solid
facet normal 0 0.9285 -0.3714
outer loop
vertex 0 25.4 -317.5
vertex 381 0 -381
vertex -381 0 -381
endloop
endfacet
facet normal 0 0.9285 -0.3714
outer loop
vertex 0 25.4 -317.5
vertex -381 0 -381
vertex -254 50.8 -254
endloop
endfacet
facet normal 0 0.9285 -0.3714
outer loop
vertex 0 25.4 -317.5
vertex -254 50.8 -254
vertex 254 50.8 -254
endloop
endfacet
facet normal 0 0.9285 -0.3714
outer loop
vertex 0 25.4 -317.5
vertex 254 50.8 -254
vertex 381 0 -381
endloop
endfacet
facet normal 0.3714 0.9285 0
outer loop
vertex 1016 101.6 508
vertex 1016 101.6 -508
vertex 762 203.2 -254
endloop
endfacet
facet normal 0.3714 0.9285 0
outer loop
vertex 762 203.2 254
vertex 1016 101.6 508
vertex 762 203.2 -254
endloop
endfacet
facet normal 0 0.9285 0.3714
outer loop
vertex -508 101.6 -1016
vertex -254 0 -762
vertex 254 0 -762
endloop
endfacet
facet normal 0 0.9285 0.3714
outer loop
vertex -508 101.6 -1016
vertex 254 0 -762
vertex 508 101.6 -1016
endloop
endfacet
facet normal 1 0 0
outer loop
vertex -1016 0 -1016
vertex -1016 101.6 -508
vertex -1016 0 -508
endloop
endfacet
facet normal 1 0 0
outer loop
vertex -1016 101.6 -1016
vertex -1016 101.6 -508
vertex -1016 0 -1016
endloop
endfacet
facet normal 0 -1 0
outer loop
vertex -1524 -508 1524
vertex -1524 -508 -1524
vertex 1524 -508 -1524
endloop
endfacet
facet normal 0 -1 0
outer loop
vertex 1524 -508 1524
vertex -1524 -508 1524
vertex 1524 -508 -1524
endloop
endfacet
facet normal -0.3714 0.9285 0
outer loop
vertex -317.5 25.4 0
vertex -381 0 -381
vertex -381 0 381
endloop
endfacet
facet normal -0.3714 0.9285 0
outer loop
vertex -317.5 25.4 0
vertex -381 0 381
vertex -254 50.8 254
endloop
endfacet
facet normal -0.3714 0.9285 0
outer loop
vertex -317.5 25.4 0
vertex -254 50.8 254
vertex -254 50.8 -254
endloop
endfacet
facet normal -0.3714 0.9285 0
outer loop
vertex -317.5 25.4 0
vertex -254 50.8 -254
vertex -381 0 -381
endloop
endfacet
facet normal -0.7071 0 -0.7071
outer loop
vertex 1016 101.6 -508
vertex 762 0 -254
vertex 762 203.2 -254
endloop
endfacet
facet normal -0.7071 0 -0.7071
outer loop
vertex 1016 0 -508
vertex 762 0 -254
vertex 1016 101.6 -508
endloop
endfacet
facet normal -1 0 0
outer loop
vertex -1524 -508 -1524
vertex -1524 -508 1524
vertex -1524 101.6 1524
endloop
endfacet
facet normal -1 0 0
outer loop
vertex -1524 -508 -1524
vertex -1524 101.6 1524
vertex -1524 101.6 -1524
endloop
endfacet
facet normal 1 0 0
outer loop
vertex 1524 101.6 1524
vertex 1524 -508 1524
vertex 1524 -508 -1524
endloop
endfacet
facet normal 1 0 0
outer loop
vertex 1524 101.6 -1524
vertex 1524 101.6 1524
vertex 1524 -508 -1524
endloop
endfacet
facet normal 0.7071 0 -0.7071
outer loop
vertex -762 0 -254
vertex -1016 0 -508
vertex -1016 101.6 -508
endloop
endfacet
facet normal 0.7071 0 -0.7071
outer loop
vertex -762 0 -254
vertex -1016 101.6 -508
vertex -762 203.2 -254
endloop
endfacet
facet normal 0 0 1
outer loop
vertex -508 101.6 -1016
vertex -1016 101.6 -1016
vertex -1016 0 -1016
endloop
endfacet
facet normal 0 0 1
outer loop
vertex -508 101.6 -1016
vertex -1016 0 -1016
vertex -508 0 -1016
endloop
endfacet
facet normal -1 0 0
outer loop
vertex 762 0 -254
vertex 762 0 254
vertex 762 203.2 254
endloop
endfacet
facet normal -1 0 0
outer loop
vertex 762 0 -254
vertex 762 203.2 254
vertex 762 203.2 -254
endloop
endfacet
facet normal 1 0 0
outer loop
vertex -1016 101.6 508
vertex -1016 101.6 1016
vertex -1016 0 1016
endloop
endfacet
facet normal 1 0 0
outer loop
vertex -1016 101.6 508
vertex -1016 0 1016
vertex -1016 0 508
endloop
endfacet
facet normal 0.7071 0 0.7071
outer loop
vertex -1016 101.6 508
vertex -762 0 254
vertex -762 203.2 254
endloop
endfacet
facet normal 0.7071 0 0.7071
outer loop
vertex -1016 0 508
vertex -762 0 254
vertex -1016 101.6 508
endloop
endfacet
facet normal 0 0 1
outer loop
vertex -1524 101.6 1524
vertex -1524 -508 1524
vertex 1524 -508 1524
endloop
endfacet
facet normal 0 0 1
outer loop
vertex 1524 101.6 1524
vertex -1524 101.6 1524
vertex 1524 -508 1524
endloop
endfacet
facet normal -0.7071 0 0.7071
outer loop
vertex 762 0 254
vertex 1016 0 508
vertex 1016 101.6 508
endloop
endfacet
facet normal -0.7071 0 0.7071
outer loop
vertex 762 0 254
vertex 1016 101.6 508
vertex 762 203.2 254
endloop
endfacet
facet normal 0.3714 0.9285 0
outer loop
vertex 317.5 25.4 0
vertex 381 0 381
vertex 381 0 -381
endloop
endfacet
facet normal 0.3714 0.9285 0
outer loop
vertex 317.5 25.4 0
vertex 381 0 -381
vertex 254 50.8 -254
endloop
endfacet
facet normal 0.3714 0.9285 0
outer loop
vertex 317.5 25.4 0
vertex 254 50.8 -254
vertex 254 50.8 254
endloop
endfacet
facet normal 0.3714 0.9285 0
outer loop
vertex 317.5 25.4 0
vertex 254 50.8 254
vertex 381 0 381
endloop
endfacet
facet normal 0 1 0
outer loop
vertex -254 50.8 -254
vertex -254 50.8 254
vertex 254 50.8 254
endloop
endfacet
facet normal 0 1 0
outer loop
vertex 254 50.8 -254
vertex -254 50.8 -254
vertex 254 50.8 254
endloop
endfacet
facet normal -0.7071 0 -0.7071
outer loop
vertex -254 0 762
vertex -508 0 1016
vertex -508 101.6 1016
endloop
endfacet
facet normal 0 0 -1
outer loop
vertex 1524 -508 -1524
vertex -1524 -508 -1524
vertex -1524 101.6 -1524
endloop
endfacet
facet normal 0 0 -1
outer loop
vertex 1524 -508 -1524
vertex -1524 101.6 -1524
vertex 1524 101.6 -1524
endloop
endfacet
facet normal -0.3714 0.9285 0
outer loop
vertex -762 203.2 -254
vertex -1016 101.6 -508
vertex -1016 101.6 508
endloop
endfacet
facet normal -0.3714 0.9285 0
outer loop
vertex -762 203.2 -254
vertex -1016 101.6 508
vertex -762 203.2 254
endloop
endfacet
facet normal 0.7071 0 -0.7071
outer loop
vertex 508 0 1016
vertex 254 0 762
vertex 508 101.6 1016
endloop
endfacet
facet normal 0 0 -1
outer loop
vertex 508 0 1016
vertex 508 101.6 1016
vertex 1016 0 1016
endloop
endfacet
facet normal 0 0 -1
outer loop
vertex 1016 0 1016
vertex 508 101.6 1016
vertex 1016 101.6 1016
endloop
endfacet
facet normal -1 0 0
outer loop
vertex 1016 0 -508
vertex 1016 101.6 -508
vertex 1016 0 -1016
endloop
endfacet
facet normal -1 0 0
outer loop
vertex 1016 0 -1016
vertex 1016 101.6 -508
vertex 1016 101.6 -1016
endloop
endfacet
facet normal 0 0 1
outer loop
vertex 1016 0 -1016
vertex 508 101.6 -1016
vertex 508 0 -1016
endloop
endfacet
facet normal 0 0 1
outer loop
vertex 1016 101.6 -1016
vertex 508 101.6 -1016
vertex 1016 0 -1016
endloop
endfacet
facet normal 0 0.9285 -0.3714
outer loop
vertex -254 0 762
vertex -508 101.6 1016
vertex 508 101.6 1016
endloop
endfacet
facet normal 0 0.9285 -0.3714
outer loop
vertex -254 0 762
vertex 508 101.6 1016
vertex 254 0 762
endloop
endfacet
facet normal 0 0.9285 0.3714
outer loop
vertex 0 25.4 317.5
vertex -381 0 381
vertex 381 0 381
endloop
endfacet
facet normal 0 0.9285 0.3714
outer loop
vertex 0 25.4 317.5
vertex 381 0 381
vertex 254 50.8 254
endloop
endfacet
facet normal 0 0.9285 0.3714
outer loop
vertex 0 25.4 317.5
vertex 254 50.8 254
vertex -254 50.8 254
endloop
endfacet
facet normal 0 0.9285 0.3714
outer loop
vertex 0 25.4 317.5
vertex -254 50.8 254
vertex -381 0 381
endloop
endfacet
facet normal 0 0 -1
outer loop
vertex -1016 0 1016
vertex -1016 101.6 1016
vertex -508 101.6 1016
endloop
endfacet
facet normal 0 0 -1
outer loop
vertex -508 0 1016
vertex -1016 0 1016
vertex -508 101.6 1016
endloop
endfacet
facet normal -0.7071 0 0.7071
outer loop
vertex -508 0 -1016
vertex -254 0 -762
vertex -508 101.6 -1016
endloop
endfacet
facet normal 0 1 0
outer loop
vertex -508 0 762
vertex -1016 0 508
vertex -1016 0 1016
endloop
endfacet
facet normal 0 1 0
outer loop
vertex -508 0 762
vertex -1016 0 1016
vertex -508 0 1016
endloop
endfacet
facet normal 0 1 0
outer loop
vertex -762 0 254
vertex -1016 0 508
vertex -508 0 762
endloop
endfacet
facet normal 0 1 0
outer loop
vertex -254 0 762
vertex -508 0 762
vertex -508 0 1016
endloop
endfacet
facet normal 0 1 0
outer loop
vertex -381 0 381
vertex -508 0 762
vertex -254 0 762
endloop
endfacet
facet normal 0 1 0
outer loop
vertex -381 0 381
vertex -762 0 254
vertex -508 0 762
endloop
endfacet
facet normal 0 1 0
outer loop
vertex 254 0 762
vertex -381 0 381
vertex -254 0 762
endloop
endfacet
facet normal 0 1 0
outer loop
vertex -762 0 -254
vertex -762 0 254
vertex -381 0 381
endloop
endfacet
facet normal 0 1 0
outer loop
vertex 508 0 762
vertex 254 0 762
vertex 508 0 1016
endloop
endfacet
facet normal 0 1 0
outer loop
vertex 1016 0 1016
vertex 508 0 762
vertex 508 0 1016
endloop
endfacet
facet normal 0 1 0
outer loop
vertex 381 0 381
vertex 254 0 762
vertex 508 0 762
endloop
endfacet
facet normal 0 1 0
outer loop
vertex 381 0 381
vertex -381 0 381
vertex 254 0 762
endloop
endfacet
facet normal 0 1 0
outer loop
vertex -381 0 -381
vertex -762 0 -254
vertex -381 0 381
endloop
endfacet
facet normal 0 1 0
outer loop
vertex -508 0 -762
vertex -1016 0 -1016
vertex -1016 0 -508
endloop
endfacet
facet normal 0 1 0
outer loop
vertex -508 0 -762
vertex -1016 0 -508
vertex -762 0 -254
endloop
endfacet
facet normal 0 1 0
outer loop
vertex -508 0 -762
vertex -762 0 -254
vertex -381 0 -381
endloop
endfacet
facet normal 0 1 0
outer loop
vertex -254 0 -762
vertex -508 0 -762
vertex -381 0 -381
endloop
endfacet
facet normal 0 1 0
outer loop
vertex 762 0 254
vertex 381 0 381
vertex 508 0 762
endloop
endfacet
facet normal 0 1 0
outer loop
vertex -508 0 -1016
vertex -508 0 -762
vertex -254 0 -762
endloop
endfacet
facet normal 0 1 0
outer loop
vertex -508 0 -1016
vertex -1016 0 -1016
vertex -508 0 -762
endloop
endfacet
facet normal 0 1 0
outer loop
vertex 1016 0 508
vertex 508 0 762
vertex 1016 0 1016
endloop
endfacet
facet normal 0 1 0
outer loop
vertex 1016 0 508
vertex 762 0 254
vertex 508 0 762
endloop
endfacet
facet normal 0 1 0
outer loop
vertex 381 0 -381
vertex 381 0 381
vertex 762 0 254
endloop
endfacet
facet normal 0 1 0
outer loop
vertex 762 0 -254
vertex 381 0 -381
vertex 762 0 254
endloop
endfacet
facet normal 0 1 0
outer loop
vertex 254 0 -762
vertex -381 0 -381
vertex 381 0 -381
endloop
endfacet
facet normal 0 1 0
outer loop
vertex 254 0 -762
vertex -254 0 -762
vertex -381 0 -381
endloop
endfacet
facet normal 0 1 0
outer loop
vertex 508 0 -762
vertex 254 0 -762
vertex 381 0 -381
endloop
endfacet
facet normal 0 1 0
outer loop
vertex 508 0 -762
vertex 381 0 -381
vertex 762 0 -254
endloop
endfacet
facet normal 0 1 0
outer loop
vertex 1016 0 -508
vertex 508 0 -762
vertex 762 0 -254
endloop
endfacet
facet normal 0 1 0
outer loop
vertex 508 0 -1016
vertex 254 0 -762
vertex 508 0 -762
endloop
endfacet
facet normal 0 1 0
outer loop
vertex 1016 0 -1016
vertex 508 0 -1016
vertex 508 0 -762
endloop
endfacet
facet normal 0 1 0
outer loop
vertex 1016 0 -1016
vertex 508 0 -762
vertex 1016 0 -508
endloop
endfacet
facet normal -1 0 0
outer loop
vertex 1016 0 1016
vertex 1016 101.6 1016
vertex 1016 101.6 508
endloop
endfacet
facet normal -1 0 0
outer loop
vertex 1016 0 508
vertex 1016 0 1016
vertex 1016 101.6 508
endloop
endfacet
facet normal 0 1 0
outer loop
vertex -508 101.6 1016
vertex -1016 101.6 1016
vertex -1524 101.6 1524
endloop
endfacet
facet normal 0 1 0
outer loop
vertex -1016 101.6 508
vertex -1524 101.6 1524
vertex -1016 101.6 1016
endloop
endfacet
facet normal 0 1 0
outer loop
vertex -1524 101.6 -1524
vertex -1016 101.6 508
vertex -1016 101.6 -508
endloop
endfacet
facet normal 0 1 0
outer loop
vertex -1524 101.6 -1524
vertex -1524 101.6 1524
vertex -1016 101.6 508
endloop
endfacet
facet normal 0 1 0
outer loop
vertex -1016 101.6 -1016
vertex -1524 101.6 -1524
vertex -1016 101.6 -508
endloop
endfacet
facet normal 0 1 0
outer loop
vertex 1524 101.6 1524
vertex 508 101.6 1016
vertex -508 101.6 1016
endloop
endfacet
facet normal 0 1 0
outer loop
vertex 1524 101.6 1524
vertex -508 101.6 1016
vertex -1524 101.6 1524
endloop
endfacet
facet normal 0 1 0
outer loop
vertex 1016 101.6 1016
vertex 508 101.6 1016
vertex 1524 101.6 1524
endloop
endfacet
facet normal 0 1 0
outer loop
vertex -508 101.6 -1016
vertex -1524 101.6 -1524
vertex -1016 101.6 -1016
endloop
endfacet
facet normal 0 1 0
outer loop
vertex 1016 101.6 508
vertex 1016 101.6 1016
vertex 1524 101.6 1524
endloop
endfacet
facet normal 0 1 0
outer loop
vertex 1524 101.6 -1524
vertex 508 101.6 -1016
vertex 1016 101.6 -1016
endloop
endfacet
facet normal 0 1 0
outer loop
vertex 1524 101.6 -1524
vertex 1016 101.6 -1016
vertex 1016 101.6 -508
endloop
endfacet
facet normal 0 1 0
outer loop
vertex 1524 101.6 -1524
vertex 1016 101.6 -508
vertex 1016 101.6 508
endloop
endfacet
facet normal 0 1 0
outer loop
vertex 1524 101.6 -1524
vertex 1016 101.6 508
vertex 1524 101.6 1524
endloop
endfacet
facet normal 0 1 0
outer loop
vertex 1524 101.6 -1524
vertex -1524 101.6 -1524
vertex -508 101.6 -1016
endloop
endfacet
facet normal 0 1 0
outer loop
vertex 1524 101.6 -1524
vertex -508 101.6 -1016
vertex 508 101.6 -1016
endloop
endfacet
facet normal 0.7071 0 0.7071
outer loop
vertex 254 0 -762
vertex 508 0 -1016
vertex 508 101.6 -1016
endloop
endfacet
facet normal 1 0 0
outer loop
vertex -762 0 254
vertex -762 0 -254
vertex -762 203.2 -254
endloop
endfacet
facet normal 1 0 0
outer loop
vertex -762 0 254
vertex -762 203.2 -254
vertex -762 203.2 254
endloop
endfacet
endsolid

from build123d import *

# Parameters (mm, degrees)
EXTRUDE1_DEPTH       = 101.6
EXTRUDE1_DEPTH_BACK  = 508
SKETCH1_W            = 3048
SKETCH1_H            = 3048
SKETCH2_W            = 2032
SKETCH2_H            = 2032
EXTRUDE2_DEPTH       = 101.6
SKETCH3_W            = 762
SKETCH3_H            = 762
EXTRUDE3_DEPTH       = 50.8
EXTRUDE3_TAPER       = 68.1986
EXTRUDE6_DEPTH       = 101.6
EXTRUDE7_DEPTH       = 508
EXTRUDE7_DEPTH_BACK  = 508
EXTRUDE8_DEPTH       = 203.2
EXTRUDE12_DEPTH      = 508
EXTRUDE12_DEPTH_BACK = 508


with BuildPart() as part:
    # Sketch1 → Extrude1 (new, two sides: drawn at the far end of the back side and taken through both)
    with BuildSketch(Plane(origin=(0, 0, 0), x_dir=(1, 0, 0), z_dir=(0, 1, 0)).offset(-EXTRUDE1_DEPTH_BACK)):
        Rectangle(SKETCH1_W, SKETCH1_H)
    extrude(amount=EXTRUDE1_DEPTH + EXTRUDE1_DEPTH_BACK)

    # Sketch2 → Extrude2 (cut)
    with BuildSketch(Plane(origin=(0, 101.6, 0), x_dir=(1, 0, 0), z_dir=(0, 1, 0))):
        Rectangle(SKETCH2_W, SKETCH2_H)
    extrude(amount=-EXTRUDE2_DEPTH, mode=Mode.SUBTRACT)

    # Sketch3 → Extrude3 (add)
    with BuildSketch(Plane(origin=(0, 0, 0), x_dir=(1, 0, 0), z_dir=(0, 1, 0))):
        Rectangle(SKETCH3_W, SKETCH3_H)
    extrude(amount=EXTRUDE3_DEPTH, taper=EXTRUDE3_TAPER)

    # Sketch4 → Extrude6 (add)
    with BuildSketch(Plane(origin=(0, 0, 0), x_dir=(1, 0, 0), z_dir=(0, 1, 0))):
        Polygon((-253.999939021, 762), (-507.999939021, 1016), (507.999939021, 1016), (253.999939021, 762), align=None)
        Polygon((-253.999939021, -762), (253.999939021, -762), (507.999939021, -1016), (-507.999939021, -1016), align=None)
    extrude(amount=EXTRUDE6_DEPTH)

    # Sketch6 → Extrude7 (cut, two sides: drawn at the far end of the back side and taken through both)
    with BuildSketch(Plane(origin=(0, 0, 0), x_dir=(0, 0, -1), z_dir=(1, 0, 0)).offset(-EXTRUDE7_DEPTH_BACK)):
        Polygon((762, 101.6), (762, 0), (1016, 101.6), align=None)
        Polygon((-1016, 101.6), (-762, 0), (-762, 101.6), align=None)
    extrude(amount=EXTRUDE7_DEPTH + EXTRUDE7_DEPTH_BACK, mode=Mode.SUBTRACT)

    # Sketch8 → Extrude8 (add)
    with BuildSketch(Plane(origin=(0, 0, 0), x_dir=(1, 0, 0), z_dir=(0, 1, 0))):
        Polygon((762, 253.999939021), (1016, 507.999939021), (1016, -507.999939021), (762, -253.999939021), align=None)
        Polygon((-762, 253.999939021), (-762, -253.999939021), (-1016, -507.999939021), (-1016, 507.999939021), align=None)
    extrude(amount=EXTRUDE8_DEPTH)

    # Sketch10 → Extrude12 (cut, two sides: drawn at the far end of the back side and taken through both)
    with BuildSketch(Plane.XY.offset(-EXTRUDE12_DEPTH_BACK)):
        Polygon((-1016, 203.2), (-1016, 101.6), (-762, 203.2), align=None)
        Polygon((1016, 203.2), (1016, 101.6), (762, 203.2), align=None)
    extrude(amount=EXTRUDE12_DEPTH + EXTRUDE12_DEPTH_BACK, mode=Mode.SUBTRACT)


solid = part.part
